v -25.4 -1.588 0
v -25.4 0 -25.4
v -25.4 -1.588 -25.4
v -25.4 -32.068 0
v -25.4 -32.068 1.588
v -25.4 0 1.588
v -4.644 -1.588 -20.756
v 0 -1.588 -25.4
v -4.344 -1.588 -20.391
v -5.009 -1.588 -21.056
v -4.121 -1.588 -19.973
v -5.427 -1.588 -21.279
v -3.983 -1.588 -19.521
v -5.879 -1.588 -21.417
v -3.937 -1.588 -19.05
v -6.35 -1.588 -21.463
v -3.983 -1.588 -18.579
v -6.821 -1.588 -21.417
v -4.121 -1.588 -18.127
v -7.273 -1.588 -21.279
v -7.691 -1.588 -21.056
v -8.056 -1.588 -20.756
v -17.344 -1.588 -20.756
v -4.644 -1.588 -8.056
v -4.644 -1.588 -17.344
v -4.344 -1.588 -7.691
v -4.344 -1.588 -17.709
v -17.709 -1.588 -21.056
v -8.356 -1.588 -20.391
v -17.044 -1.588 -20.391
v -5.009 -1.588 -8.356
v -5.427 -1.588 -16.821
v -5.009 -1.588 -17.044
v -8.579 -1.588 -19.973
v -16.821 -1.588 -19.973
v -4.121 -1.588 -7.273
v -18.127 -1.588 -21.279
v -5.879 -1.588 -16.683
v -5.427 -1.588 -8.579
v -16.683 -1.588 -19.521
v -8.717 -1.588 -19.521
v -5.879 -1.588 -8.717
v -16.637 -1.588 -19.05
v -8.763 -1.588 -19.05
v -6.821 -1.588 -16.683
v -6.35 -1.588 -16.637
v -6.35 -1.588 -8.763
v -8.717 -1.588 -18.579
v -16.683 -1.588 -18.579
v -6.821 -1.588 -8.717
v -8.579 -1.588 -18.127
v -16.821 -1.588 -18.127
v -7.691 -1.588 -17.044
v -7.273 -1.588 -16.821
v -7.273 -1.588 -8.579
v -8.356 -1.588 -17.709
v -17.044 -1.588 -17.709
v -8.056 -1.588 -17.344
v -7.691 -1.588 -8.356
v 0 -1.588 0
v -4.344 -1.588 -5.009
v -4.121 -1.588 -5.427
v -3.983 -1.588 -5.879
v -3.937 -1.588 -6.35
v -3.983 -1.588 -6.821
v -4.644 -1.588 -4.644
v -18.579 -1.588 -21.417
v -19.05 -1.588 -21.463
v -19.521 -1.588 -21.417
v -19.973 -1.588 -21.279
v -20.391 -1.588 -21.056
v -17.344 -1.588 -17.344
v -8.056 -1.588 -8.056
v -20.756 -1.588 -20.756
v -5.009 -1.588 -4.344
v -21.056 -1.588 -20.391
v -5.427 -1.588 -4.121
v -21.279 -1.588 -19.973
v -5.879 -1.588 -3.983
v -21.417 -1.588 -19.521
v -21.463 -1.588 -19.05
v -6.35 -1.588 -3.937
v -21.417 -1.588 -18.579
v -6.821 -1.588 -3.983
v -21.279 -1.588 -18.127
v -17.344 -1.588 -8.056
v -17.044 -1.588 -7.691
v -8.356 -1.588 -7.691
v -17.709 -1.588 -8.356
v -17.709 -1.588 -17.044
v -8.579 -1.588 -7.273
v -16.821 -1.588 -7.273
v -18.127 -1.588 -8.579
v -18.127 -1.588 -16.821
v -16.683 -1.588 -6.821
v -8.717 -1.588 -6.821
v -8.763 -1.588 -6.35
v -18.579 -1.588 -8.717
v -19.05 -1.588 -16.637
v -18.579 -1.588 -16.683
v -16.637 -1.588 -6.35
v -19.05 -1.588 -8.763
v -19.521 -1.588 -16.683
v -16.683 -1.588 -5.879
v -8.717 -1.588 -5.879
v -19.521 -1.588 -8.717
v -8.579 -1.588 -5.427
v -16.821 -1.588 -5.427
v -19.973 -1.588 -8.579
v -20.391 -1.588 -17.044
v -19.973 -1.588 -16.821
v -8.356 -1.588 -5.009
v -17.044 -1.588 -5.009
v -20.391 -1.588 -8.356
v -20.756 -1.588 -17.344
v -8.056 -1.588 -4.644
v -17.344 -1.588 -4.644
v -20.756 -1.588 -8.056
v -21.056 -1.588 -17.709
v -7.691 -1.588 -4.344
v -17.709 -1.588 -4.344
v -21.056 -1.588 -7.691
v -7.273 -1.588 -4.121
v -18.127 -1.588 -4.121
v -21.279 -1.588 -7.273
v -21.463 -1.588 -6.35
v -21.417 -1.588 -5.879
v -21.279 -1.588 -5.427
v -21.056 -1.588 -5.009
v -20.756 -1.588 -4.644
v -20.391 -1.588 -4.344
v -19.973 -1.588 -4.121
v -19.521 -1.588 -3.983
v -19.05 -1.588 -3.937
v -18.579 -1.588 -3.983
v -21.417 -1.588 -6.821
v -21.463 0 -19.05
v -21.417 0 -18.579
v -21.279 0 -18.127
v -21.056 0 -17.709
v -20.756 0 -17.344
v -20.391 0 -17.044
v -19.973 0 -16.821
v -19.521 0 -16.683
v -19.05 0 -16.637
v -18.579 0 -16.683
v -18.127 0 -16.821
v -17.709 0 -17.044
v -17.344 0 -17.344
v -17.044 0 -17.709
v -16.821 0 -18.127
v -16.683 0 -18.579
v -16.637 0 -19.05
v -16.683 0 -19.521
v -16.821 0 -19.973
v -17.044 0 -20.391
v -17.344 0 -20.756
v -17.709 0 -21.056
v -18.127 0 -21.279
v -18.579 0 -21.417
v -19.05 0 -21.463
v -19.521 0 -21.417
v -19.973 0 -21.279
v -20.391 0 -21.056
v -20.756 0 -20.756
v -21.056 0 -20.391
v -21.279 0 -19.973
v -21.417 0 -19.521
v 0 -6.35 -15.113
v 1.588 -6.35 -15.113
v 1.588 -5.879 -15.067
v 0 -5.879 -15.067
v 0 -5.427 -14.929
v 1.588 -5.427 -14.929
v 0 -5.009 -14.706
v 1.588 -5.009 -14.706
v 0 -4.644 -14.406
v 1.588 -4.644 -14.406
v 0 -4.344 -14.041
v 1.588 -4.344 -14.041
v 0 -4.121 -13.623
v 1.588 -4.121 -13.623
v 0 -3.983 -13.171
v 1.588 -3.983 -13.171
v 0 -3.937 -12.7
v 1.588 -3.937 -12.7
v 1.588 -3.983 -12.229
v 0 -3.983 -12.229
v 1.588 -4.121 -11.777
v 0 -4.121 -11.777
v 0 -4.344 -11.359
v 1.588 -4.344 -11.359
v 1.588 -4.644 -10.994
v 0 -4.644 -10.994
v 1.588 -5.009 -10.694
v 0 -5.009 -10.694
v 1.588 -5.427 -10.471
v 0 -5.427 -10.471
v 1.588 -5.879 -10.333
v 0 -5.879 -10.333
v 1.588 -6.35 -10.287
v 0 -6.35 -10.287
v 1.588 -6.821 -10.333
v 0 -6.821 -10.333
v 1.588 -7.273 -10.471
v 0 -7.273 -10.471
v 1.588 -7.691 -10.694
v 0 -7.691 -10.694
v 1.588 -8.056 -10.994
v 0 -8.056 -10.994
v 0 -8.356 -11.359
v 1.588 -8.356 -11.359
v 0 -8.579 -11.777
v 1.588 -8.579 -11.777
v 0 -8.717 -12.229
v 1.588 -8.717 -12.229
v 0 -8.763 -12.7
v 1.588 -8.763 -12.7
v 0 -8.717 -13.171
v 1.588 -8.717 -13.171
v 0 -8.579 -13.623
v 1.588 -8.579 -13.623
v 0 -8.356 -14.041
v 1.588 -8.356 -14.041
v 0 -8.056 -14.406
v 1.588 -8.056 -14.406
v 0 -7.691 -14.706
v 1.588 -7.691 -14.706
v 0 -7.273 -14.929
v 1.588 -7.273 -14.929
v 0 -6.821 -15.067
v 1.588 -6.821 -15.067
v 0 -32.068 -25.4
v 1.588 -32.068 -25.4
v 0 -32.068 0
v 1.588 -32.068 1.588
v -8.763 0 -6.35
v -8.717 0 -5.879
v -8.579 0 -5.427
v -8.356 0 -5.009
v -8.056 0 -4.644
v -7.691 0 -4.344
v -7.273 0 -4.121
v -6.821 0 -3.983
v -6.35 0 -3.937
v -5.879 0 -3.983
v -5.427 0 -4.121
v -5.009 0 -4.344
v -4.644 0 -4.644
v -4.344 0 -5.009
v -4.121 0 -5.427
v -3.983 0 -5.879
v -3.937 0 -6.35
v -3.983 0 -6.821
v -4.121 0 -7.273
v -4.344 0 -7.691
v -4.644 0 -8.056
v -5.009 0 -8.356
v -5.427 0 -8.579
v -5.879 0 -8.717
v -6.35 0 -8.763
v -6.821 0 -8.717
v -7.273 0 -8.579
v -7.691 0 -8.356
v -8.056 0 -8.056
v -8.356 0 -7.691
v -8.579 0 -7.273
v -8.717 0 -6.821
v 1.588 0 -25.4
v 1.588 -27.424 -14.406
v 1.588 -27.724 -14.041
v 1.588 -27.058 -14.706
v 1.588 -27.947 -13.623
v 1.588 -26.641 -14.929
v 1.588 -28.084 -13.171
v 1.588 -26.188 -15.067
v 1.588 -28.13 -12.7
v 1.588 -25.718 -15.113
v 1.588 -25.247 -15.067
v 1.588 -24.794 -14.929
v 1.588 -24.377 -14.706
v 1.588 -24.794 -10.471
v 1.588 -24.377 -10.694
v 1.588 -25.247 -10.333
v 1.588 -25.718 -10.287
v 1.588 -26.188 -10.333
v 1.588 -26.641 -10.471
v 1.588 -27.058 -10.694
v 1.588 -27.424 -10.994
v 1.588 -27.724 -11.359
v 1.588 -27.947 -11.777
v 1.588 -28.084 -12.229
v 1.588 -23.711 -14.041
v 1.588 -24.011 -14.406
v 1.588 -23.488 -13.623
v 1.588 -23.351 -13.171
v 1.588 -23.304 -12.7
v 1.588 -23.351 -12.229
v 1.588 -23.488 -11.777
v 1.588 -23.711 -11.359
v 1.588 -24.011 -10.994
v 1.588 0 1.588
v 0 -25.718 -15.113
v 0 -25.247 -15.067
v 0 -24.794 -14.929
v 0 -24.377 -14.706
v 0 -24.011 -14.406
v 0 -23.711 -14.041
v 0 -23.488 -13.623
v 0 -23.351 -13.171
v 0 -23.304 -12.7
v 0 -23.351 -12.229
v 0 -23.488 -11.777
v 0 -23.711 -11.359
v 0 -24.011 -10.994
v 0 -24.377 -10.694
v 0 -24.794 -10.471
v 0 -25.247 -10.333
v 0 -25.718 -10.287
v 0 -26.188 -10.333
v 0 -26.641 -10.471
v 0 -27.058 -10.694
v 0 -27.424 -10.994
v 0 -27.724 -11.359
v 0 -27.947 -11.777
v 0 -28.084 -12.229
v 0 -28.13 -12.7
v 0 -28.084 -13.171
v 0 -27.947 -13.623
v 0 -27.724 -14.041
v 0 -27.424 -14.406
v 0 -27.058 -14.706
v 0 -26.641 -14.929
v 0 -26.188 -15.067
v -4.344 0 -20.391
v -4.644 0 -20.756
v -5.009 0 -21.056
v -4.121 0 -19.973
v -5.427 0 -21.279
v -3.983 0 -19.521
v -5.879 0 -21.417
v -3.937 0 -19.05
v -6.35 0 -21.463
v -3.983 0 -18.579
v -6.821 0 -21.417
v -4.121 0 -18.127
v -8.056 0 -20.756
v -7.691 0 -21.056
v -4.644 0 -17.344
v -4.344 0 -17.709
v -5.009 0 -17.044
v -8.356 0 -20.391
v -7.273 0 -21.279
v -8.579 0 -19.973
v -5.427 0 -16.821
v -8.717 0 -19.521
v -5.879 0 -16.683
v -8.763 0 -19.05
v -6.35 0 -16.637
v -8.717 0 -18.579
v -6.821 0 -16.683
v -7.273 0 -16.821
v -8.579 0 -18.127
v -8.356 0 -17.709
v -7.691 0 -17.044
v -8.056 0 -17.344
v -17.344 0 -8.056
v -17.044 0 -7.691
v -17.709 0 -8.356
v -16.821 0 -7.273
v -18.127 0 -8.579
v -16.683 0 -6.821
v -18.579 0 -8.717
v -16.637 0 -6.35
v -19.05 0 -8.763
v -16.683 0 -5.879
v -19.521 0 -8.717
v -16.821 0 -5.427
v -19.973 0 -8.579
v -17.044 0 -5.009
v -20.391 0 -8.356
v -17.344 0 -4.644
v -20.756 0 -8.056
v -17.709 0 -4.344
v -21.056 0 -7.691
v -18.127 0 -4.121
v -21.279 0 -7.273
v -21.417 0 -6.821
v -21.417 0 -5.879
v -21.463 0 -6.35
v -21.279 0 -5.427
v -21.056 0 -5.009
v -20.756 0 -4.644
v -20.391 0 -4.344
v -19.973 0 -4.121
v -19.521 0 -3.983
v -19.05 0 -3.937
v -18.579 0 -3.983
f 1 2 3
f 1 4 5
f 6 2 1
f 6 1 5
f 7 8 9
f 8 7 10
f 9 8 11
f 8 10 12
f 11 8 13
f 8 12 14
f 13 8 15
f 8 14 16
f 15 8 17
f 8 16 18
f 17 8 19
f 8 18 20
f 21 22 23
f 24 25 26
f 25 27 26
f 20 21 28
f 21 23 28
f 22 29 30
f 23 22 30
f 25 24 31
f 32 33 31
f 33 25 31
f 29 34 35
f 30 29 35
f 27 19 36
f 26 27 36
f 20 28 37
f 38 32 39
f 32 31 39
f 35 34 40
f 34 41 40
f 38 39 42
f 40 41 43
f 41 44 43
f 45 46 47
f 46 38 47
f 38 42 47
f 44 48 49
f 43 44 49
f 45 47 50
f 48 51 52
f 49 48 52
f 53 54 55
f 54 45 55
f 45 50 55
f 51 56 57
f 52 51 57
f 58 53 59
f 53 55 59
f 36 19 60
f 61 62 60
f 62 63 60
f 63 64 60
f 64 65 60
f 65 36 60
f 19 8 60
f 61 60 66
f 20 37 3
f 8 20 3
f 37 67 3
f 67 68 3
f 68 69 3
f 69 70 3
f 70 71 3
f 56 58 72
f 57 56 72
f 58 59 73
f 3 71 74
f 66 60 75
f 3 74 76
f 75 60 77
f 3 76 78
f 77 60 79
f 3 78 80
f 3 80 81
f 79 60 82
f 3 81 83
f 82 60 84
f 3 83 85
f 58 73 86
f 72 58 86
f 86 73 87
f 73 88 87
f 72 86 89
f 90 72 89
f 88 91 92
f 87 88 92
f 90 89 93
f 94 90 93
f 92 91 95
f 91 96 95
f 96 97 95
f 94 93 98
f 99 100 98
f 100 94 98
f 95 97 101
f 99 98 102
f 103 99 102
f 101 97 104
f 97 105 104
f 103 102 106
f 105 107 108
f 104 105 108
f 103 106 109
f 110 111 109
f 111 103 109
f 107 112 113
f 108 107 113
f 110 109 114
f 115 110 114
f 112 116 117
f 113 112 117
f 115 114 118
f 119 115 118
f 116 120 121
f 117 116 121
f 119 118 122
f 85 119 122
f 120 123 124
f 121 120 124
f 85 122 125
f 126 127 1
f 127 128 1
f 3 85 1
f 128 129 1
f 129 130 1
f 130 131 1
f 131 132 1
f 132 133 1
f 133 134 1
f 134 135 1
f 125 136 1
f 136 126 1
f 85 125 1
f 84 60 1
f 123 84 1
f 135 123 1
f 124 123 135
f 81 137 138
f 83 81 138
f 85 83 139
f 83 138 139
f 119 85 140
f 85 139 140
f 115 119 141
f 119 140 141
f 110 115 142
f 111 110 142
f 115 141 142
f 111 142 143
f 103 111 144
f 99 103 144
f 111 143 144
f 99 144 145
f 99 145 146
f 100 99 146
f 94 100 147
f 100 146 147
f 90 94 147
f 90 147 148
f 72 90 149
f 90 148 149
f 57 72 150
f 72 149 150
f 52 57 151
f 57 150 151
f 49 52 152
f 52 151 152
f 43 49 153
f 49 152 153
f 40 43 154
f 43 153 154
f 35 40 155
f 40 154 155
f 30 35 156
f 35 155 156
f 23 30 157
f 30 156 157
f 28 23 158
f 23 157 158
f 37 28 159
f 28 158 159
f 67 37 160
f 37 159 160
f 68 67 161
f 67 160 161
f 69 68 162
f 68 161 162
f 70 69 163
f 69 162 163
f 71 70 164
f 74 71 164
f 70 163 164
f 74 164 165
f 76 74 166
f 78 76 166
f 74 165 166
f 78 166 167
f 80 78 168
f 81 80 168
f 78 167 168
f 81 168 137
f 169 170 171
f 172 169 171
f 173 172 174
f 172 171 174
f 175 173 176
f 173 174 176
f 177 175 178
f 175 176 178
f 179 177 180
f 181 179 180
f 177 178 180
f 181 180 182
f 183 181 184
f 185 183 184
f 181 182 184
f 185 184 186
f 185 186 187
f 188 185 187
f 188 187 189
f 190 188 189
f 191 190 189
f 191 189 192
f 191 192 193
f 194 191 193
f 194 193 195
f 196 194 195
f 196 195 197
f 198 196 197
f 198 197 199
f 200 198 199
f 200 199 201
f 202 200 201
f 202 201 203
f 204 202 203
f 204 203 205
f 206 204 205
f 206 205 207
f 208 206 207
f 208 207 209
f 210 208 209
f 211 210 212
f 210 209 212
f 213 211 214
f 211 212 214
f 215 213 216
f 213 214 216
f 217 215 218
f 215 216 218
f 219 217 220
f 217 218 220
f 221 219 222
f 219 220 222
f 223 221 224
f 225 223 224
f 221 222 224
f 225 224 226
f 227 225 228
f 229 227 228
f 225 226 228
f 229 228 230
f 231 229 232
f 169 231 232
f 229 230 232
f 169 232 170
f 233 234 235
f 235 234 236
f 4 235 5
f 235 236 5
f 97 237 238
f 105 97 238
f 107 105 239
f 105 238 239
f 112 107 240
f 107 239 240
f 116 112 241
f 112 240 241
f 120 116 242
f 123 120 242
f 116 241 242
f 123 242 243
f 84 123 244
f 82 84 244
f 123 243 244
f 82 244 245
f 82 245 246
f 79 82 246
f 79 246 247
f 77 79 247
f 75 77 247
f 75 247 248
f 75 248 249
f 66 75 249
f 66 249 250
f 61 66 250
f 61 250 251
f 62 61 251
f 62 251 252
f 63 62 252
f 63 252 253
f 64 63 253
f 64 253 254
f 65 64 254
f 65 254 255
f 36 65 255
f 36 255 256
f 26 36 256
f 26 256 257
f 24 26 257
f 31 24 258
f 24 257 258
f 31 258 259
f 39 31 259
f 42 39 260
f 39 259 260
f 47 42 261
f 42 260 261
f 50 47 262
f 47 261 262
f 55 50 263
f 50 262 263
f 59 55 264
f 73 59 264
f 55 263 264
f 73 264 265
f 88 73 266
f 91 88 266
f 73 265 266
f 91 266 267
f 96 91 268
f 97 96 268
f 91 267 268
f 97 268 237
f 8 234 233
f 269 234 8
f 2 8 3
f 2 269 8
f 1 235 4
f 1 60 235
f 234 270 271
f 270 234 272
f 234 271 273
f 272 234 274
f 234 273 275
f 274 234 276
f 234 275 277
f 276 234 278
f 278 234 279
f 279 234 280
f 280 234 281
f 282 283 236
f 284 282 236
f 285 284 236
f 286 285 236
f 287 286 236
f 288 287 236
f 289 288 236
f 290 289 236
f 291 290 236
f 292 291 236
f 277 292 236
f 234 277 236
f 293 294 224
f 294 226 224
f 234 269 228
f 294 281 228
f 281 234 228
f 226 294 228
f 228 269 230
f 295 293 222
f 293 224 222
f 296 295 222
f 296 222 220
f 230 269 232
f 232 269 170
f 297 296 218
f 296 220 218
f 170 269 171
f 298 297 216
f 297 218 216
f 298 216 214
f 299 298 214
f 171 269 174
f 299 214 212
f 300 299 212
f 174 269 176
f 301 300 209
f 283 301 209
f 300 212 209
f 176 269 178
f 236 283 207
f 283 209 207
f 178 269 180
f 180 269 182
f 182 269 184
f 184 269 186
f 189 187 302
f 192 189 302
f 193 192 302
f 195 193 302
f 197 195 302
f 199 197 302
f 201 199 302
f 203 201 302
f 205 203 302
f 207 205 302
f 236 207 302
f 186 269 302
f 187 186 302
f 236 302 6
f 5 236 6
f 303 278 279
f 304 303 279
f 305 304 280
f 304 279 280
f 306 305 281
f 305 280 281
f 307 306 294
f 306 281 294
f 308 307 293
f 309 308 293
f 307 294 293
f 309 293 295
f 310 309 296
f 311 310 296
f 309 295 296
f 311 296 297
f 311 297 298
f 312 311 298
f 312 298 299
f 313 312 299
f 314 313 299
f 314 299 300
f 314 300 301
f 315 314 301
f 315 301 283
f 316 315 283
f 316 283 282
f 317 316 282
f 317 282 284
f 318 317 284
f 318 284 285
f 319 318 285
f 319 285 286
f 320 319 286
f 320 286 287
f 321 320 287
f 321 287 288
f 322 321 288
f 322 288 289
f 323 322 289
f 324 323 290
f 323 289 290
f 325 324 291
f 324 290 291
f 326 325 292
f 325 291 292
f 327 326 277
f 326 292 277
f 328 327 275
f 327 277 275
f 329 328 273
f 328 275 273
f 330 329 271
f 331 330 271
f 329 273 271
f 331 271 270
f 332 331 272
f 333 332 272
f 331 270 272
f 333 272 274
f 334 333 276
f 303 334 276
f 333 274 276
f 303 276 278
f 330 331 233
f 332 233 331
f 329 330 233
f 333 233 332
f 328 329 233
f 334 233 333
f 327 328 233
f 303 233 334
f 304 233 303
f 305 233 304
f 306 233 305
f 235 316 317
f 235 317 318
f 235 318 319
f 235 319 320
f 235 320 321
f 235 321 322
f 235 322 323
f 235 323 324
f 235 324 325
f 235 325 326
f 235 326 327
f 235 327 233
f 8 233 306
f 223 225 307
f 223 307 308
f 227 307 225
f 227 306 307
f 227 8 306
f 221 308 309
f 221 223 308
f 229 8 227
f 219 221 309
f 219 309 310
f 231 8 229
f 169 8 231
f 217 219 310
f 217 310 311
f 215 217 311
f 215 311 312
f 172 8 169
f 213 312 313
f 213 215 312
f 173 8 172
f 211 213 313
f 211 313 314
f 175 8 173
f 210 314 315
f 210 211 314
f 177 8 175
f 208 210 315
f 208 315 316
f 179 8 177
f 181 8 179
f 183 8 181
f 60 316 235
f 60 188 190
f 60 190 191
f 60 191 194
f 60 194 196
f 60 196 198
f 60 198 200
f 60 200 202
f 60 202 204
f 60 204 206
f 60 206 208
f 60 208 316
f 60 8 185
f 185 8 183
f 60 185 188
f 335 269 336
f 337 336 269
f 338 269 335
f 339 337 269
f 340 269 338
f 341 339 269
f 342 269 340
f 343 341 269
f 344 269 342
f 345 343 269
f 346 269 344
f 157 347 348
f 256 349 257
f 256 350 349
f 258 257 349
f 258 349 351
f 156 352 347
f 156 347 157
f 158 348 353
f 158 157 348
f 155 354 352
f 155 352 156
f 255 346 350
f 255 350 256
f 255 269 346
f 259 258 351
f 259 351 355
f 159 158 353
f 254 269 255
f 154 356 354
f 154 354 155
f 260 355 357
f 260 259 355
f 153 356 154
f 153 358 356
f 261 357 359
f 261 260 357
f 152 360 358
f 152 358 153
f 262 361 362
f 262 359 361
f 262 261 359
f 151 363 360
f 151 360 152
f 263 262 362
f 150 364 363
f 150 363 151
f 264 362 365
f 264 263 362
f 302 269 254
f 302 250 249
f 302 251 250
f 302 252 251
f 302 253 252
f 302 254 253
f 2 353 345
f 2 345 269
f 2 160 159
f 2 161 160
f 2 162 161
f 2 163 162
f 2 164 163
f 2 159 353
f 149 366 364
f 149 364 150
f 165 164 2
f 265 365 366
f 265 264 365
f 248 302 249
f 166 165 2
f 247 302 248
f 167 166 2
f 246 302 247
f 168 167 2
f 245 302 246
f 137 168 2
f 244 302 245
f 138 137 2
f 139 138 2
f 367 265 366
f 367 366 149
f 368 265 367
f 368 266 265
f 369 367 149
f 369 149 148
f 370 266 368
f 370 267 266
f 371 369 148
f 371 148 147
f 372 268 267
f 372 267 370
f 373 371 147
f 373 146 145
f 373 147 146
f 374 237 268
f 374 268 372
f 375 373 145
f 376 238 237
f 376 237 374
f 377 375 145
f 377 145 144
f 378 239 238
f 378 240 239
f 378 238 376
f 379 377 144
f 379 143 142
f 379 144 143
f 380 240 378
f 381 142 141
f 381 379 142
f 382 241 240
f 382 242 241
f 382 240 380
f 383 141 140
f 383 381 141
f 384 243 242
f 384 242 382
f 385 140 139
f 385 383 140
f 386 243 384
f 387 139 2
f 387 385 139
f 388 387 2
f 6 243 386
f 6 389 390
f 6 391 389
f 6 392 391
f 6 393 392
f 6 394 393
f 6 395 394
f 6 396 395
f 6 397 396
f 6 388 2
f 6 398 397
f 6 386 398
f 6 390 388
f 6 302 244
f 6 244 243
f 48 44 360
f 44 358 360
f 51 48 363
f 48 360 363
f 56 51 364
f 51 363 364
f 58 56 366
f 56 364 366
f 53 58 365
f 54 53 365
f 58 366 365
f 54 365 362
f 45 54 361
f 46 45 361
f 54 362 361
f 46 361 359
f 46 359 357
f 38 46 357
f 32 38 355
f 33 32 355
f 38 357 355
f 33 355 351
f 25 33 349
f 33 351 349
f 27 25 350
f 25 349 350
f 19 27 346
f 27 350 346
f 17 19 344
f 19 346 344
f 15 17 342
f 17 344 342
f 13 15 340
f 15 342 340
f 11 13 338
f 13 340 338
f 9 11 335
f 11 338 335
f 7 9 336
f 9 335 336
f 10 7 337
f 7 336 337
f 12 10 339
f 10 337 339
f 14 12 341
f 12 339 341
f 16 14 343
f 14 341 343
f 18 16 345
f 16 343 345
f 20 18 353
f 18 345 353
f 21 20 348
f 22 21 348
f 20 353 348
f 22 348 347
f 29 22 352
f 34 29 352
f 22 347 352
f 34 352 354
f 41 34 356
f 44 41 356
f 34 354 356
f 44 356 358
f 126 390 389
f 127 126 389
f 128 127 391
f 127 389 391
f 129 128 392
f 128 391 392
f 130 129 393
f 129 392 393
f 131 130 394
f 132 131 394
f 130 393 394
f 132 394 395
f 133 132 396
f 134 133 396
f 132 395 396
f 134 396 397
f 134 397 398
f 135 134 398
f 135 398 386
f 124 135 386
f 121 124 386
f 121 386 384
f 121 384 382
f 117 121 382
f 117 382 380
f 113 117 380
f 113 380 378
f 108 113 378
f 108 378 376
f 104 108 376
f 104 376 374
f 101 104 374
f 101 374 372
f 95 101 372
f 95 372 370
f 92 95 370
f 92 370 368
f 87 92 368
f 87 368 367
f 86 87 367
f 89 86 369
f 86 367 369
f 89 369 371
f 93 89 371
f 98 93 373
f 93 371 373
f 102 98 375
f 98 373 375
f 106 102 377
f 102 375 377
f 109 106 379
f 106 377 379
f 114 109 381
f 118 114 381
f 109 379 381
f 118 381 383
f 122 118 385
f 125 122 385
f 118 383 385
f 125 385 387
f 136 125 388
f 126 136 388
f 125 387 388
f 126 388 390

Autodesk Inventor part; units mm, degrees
ref_plane "YZ Plane" through (0, 0, 0) normal (1, 0, 0) x (0, 1, 0)
ref_plane "XZ Plane" through (0, 0, 0) normal (0, 1, 0) x (-1, 0, 0)
ref_plane "XY Plane" through (0, 0, 0) normal (0, 0, 1) x (1, 0, 0)
sketch "Sketch1" plane through (0, 0, 0) normal (0, 1, 0) x (-1, 0, 0)
  line L0 (0, 0) -> (25.4, 0)
  line L1 (25.4, 0) -> (25.4, -25.4)
  line L2 (25.4, -25.4) -> (0, -25.4)
  line L3 (0, -25.4) -> (0, 0)
  line L4 (-1.5875, 1.5875) -> (26.9875, 1.5875)
  line L5 (26.9875, 1.5875) -> (26.9875, -26.9875)
  line L6 (26.9875, -26.9875) -> (-1.5875, -26.9875)
  line L7 (-1.5875, -26.9875) -> (-1.5875, 1.5875)
  circle A0 centre (19.05, -6.35) radius 2.413
  circle A1 centre (19.05, -19.05) radius 2.413
  circle A2 centre (6.35, -6.35) radius 2.413
  circle A3 centre (6.35, -19.05) radius 2.413
  dimension "d0" = 25.4
  dimension "d1" = 25.4
  dimension "d2" = 1.5875
  dimension "d3" = 6.35
  dimension "d4" = 6.35
  dimension "d5" = 4.826
  dimension "d8" = 12.7
  dimension "d11" = 12.7
extrude "Extrusion1" add sketch "Sketch1" against normal blind 1.5875 contours L0 L1 L2 L3 | L4 L5 L6 L7
extrude "Extrusion2" add sketch "Sketch1" against normal blind 32.0675 contours L4 L5 L6 L7
sketch "Sketch2" plane through (1.5875, 0, 1.5875) normal (1, 0, 0) x (0, 0, -1)
  line L0 (0, 0) -> (28.575, 0) construction
  line L1 (14.2875, 0) -> (14.2875, -32.0675) construction
  line L2 (26.9875, -32.0675) -> (1.5875, -32.0675) construction
  circle A0 centre (14.2875, -6.35) radius 2.413
  circle A1 centre (14.2875, -25.7175) radius 2.413
  point P0 (1.5875, 0)
  dimension "d18" = 4.826
  dimension "d19" = 4.826
  dimension "d20" = 6.35
  dimension "d21" = 6.35
extrude "Extrusion3" cut sketch "Sketch2" against normal blind 32.0675
sketch "Sketch3" plane through (-26.9875, 0, -26.9875) normal (-1, 0, 0) x (0, 0, 1)
  circle A0 centre (14.2875, -25.7175) radius 2.413 projected
  circle A1 centre (14.2875, -6.35) radius 2.413 projected
  line L0 (0, 0) -> (28.575, 0) projected
  line L1 (0, 0) -> (0, -32.0675) projected
  line L2 (28.575, -32.0675) -> (0, -32.0675) projected
  line L3 (28.575, 0) -> (28.575, -32.0675) projected
  point P0 (26.9875, 0)
sketch "Sketch4" plane through (1.5875, 0, -26.9875) normal (0, 0, -1) x (-1, 0, 0)
  line L0 (0, 0) -> (28.575, 0) projected
  line L1 (0, 0) -> (0, -32.0675) projected
  line L2 (28.575, -32.0675) -> (0, -32.0675) projected
  line L3 (28.575, 0) -> (28.575, -32.0675) projected
  point P0 (1.5875, 0)
extrude "Extrusion4" cut sketch "Sketch3" against normal blind 1.5875
extrude "Extrusion5" cut sketch "Sketch4" against normal blind 1.5875
equation "\"d18\" = d19"
equation "\"d21\" = d20"
properties part number "FlipperTensionerBlock2Tool"
